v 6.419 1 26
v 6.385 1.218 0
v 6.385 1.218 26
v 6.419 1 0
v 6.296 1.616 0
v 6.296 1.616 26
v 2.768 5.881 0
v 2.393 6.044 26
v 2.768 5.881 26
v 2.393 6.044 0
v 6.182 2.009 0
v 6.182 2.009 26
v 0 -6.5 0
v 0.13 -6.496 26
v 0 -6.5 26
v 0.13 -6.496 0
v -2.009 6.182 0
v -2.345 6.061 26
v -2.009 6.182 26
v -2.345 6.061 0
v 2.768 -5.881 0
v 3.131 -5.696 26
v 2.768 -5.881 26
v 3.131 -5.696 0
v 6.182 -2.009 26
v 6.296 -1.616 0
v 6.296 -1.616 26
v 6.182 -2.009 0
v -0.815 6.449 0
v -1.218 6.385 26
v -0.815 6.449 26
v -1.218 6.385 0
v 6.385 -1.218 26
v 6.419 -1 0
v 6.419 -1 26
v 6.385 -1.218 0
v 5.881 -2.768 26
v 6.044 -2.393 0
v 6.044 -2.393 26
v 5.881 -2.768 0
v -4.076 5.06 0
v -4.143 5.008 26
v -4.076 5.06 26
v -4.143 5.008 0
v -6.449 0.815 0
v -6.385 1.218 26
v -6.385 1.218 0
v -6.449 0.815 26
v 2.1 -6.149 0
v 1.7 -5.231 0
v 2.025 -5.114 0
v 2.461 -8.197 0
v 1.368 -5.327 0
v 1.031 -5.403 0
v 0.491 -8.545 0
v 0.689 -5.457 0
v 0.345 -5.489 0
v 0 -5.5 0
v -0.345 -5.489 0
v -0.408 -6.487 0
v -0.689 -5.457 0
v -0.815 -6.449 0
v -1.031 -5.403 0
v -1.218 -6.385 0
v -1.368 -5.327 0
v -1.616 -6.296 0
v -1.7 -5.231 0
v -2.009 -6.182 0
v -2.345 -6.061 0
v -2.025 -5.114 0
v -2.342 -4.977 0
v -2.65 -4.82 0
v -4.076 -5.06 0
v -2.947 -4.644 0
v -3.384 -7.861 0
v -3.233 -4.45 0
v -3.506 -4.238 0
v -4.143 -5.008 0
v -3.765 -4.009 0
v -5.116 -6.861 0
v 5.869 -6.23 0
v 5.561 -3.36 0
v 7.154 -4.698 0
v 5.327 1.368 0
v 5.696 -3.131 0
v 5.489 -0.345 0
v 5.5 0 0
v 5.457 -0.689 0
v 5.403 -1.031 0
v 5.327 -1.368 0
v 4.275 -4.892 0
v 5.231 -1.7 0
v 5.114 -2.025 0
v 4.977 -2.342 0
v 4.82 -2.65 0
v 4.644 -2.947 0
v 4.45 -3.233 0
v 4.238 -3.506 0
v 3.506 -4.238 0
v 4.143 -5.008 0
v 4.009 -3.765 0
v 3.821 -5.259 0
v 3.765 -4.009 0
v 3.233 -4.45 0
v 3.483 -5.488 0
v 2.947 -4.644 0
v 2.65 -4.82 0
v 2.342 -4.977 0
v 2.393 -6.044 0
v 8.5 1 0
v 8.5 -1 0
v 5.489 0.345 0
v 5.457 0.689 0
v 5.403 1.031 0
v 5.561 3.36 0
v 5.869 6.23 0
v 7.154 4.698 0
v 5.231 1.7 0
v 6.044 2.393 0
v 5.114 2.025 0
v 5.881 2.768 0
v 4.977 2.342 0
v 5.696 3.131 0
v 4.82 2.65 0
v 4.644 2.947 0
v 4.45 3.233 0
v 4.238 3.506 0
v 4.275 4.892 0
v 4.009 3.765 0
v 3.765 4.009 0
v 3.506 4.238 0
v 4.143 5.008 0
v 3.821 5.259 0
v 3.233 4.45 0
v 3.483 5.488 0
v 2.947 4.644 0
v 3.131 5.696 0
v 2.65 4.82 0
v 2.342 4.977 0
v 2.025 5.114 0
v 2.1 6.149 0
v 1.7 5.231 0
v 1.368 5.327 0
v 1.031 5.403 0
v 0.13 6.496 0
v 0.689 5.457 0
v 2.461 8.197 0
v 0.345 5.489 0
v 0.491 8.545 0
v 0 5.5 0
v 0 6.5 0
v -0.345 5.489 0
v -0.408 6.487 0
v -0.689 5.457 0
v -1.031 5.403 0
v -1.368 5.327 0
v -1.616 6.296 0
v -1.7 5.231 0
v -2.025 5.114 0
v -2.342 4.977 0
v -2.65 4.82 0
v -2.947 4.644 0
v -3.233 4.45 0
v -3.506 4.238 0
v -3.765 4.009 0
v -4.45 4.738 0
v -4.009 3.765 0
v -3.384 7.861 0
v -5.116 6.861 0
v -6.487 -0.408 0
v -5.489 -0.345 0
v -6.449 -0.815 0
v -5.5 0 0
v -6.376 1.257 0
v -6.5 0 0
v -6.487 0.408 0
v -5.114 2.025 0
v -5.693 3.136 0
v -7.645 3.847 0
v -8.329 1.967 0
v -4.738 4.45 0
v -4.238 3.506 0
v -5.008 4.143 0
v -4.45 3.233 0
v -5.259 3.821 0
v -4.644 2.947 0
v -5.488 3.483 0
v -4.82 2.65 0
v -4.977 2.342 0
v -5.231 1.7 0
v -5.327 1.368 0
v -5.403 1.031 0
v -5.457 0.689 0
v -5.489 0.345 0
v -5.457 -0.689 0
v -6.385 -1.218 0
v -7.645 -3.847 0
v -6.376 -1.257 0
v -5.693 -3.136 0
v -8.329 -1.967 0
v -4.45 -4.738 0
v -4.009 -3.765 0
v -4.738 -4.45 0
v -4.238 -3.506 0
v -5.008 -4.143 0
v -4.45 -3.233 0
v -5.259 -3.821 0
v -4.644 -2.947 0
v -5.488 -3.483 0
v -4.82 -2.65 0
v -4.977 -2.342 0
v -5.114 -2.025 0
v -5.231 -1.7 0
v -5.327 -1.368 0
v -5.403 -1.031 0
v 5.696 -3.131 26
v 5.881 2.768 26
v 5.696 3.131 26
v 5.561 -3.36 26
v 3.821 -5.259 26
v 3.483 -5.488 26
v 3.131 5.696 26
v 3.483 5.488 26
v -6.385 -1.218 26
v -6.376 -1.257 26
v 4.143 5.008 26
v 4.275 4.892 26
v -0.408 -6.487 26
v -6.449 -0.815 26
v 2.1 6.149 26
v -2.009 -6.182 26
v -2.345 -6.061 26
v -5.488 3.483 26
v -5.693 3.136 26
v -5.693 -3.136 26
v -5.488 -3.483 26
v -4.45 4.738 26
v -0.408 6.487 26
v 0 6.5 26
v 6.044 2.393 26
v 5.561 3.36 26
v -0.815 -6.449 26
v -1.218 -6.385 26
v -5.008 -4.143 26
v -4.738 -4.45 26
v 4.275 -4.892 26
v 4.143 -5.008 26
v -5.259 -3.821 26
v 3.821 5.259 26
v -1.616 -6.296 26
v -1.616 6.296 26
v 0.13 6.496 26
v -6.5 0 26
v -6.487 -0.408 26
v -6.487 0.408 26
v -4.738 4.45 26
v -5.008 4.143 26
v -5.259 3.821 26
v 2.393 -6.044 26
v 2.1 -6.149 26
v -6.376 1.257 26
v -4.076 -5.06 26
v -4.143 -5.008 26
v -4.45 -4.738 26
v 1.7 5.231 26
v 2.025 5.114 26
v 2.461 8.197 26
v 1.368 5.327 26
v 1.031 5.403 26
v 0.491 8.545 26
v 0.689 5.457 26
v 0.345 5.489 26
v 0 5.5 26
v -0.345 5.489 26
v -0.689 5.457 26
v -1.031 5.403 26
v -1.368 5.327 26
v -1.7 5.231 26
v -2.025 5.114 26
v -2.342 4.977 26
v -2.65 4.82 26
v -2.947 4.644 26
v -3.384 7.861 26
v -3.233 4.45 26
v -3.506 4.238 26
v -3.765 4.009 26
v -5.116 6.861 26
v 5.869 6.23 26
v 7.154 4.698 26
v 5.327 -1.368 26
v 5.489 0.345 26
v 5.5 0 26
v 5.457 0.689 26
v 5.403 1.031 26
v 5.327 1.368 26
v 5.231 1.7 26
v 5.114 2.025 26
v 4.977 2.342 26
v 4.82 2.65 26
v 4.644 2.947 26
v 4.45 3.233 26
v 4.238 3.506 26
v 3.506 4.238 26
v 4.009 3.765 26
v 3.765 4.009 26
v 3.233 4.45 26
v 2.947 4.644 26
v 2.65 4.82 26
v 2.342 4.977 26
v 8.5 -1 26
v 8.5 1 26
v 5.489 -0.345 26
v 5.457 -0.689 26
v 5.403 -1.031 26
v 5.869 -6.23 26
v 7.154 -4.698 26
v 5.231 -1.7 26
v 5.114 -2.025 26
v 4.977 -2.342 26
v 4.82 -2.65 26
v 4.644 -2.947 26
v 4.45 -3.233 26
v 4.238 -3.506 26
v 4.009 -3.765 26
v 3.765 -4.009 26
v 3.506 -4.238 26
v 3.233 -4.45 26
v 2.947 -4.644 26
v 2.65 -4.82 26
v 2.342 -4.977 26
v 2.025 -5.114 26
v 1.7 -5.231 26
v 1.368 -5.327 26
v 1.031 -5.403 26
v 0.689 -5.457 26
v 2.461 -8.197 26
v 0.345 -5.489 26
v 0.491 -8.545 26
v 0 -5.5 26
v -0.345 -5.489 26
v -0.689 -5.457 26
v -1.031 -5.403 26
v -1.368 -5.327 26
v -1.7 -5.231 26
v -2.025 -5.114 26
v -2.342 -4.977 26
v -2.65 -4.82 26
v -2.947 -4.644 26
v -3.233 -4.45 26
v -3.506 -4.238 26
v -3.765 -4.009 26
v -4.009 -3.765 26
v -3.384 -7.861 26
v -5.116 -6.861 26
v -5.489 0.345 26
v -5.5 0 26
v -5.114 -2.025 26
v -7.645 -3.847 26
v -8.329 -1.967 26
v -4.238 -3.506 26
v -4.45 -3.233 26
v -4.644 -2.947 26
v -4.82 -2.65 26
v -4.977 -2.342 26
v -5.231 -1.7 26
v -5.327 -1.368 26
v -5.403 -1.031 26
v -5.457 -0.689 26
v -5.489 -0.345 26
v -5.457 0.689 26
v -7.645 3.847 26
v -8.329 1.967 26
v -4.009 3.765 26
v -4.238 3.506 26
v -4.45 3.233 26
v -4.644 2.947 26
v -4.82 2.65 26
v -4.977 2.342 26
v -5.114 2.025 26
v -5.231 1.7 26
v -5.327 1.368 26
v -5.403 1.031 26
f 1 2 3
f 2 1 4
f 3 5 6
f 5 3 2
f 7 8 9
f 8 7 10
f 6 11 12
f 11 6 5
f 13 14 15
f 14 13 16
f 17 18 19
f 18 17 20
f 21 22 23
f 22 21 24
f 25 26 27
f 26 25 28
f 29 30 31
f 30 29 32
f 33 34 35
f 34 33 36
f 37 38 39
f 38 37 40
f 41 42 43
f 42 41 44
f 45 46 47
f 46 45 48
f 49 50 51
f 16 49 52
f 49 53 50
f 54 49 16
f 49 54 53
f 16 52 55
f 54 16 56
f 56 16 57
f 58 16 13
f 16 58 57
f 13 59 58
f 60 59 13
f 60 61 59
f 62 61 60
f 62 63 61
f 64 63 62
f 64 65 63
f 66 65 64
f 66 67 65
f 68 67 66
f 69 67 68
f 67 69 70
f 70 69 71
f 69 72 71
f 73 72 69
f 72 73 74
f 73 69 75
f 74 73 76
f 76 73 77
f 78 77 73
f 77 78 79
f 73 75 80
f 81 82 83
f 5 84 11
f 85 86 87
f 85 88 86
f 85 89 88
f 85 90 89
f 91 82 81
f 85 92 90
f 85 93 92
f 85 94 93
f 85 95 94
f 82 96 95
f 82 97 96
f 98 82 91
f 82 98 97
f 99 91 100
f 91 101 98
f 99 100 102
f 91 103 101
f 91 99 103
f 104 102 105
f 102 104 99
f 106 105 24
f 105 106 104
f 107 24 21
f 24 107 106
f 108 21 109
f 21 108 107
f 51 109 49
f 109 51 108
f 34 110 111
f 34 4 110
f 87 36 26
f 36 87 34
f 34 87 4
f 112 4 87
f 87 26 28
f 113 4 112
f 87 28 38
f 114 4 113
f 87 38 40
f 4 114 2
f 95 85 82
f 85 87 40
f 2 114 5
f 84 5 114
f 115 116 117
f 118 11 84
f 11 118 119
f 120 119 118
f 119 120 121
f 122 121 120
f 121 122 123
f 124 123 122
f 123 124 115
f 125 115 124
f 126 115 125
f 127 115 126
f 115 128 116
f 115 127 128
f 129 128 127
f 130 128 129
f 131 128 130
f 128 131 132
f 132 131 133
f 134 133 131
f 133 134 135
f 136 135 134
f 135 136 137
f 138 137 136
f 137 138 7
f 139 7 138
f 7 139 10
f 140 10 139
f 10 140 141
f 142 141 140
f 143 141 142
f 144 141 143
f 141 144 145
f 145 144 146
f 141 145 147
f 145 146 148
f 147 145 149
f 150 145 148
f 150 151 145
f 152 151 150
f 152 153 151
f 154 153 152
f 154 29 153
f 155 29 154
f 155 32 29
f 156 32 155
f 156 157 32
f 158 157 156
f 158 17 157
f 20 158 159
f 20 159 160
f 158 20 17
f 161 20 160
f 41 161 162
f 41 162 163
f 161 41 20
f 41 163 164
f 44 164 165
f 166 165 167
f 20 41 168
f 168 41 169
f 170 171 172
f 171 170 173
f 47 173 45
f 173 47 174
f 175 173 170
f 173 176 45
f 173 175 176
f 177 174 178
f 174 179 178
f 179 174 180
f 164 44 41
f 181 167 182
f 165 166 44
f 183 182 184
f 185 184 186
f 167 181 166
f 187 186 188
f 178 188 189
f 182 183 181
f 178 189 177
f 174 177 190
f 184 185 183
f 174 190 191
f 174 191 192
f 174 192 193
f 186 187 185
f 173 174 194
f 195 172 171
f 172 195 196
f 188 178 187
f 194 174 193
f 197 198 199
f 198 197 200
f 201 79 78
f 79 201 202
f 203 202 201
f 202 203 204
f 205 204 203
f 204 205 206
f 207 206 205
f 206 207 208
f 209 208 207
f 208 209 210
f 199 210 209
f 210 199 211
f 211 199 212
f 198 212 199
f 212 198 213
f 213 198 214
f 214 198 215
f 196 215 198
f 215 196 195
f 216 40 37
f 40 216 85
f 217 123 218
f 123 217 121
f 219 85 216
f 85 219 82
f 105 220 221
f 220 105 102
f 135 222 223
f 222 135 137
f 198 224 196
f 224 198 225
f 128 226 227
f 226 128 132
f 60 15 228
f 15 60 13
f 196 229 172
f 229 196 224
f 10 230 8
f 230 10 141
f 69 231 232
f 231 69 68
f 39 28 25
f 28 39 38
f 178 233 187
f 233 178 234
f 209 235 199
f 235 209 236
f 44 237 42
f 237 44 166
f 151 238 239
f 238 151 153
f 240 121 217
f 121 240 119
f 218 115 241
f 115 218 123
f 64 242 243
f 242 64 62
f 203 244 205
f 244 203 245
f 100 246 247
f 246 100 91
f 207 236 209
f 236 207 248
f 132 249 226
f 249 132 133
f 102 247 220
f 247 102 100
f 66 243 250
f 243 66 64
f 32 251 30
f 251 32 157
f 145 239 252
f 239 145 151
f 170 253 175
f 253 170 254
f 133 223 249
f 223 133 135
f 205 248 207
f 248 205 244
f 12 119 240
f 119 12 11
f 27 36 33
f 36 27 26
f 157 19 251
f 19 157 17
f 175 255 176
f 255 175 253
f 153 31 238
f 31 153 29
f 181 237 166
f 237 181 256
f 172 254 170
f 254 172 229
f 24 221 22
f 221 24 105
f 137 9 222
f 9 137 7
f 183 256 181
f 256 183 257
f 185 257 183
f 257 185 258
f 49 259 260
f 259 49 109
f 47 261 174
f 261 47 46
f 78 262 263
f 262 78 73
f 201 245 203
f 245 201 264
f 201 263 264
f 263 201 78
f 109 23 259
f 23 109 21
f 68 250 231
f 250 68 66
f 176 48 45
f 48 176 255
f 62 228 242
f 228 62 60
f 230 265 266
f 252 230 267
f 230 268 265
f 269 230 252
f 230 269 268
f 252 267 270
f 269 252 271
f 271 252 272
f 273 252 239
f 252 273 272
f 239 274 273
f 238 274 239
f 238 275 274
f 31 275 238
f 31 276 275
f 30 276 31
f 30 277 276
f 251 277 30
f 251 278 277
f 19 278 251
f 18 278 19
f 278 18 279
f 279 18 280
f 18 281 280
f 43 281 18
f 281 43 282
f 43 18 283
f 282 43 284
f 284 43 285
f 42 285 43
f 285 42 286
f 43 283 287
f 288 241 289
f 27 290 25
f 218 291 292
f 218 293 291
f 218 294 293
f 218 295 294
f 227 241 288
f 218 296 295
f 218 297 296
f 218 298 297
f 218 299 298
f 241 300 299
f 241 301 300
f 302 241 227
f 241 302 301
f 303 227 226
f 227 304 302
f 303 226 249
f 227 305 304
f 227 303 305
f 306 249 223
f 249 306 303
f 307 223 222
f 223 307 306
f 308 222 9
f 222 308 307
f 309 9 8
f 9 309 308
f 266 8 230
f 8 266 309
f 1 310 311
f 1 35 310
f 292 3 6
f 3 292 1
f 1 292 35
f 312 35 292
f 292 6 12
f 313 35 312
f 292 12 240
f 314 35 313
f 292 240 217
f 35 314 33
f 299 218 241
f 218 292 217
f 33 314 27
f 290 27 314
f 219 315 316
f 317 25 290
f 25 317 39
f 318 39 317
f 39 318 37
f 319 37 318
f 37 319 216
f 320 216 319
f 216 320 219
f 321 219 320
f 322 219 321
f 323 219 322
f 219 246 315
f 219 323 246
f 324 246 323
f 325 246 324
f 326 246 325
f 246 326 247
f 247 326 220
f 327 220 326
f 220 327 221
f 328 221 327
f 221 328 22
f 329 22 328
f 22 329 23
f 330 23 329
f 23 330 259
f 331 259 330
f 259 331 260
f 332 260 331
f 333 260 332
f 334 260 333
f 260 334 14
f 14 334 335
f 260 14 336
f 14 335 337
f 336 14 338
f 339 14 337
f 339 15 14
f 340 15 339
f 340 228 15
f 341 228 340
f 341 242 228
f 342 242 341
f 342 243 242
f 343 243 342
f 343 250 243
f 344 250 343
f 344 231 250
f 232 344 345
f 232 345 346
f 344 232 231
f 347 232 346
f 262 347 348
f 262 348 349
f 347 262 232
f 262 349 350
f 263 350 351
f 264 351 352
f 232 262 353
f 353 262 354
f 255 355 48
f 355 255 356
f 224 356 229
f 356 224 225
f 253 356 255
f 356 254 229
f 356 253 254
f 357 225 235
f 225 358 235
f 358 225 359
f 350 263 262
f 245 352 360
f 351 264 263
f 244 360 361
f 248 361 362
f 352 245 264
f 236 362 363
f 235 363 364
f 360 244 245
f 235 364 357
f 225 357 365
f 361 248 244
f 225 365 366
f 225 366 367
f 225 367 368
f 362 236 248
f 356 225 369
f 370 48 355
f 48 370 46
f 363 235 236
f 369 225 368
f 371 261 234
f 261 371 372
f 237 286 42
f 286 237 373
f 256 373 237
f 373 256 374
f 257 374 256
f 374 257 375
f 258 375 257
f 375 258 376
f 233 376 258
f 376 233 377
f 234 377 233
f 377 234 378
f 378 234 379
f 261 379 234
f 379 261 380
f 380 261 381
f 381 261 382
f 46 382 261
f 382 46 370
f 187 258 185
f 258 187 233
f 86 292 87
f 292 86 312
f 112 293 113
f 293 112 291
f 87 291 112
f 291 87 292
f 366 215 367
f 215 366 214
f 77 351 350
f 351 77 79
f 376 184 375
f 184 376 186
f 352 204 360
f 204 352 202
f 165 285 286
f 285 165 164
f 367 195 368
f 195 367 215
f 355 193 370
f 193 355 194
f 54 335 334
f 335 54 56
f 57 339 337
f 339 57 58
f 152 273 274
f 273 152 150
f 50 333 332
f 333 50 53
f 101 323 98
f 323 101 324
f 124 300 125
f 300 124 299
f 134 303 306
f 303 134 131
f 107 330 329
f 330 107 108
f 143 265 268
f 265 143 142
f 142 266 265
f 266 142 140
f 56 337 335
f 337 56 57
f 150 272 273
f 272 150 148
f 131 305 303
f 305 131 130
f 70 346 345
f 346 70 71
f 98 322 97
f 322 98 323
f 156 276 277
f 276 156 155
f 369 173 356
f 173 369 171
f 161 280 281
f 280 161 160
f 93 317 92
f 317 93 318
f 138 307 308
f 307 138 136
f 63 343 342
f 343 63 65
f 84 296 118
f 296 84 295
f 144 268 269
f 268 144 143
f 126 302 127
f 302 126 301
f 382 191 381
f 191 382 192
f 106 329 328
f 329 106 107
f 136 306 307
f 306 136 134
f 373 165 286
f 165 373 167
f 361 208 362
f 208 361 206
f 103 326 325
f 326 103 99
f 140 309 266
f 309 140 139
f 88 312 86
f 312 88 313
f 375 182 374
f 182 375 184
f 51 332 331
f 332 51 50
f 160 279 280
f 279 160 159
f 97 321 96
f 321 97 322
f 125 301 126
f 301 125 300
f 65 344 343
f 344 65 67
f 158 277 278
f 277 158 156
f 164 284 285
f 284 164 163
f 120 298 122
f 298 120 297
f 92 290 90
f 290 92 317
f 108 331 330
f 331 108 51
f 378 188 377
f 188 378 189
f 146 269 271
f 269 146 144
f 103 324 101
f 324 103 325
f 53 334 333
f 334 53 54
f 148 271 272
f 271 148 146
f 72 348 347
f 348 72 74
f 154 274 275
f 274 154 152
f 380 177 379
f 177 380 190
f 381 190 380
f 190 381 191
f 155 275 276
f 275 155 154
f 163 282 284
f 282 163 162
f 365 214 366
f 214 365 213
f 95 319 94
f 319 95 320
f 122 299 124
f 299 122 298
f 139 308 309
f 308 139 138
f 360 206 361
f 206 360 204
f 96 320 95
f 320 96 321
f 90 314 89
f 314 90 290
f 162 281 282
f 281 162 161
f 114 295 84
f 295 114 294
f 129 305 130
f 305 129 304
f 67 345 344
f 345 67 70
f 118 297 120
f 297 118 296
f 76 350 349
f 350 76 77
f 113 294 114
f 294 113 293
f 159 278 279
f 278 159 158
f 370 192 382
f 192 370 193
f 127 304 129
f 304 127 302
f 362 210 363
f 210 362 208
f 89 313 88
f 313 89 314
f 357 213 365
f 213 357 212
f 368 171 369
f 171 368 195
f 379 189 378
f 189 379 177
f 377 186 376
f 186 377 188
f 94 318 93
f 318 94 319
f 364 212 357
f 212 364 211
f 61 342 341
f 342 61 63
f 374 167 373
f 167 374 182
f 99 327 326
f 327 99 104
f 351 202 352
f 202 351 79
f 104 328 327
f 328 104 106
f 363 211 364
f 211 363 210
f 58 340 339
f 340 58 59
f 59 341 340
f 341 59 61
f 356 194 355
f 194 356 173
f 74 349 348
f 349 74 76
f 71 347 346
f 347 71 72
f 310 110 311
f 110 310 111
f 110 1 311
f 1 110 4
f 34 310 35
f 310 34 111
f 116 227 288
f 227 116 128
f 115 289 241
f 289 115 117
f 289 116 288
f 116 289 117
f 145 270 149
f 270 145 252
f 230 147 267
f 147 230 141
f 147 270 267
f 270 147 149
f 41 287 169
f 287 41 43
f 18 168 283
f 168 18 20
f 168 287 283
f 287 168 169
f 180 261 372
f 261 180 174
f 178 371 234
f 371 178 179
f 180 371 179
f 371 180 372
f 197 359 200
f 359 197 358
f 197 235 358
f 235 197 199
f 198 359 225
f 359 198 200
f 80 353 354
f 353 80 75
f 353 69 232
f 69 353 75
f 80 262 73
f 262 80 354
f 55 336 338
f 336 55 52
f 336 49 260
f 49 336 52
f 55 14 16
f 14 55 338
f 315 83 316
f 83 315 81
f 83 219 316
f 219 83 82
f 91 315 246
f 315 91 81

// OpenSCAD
// vim: ft=c

$fn=100;

module ring(r_outer, r_inner, height) {
	difference() {
		cylinder(h = height, r=r_outer);
		translate([0, 0, -1])
			cylinder(h = height+2, r=r_inner);
	}
}

module rewinder() {
	ring(13/2, 11/2, 26);
	for (i = [0:8]) {
		rotate([0,0,40*i])
			translate([13/2-0.5,-1,0])
				cube([2.5, 2, 26]);
	}
}

rewinder();
